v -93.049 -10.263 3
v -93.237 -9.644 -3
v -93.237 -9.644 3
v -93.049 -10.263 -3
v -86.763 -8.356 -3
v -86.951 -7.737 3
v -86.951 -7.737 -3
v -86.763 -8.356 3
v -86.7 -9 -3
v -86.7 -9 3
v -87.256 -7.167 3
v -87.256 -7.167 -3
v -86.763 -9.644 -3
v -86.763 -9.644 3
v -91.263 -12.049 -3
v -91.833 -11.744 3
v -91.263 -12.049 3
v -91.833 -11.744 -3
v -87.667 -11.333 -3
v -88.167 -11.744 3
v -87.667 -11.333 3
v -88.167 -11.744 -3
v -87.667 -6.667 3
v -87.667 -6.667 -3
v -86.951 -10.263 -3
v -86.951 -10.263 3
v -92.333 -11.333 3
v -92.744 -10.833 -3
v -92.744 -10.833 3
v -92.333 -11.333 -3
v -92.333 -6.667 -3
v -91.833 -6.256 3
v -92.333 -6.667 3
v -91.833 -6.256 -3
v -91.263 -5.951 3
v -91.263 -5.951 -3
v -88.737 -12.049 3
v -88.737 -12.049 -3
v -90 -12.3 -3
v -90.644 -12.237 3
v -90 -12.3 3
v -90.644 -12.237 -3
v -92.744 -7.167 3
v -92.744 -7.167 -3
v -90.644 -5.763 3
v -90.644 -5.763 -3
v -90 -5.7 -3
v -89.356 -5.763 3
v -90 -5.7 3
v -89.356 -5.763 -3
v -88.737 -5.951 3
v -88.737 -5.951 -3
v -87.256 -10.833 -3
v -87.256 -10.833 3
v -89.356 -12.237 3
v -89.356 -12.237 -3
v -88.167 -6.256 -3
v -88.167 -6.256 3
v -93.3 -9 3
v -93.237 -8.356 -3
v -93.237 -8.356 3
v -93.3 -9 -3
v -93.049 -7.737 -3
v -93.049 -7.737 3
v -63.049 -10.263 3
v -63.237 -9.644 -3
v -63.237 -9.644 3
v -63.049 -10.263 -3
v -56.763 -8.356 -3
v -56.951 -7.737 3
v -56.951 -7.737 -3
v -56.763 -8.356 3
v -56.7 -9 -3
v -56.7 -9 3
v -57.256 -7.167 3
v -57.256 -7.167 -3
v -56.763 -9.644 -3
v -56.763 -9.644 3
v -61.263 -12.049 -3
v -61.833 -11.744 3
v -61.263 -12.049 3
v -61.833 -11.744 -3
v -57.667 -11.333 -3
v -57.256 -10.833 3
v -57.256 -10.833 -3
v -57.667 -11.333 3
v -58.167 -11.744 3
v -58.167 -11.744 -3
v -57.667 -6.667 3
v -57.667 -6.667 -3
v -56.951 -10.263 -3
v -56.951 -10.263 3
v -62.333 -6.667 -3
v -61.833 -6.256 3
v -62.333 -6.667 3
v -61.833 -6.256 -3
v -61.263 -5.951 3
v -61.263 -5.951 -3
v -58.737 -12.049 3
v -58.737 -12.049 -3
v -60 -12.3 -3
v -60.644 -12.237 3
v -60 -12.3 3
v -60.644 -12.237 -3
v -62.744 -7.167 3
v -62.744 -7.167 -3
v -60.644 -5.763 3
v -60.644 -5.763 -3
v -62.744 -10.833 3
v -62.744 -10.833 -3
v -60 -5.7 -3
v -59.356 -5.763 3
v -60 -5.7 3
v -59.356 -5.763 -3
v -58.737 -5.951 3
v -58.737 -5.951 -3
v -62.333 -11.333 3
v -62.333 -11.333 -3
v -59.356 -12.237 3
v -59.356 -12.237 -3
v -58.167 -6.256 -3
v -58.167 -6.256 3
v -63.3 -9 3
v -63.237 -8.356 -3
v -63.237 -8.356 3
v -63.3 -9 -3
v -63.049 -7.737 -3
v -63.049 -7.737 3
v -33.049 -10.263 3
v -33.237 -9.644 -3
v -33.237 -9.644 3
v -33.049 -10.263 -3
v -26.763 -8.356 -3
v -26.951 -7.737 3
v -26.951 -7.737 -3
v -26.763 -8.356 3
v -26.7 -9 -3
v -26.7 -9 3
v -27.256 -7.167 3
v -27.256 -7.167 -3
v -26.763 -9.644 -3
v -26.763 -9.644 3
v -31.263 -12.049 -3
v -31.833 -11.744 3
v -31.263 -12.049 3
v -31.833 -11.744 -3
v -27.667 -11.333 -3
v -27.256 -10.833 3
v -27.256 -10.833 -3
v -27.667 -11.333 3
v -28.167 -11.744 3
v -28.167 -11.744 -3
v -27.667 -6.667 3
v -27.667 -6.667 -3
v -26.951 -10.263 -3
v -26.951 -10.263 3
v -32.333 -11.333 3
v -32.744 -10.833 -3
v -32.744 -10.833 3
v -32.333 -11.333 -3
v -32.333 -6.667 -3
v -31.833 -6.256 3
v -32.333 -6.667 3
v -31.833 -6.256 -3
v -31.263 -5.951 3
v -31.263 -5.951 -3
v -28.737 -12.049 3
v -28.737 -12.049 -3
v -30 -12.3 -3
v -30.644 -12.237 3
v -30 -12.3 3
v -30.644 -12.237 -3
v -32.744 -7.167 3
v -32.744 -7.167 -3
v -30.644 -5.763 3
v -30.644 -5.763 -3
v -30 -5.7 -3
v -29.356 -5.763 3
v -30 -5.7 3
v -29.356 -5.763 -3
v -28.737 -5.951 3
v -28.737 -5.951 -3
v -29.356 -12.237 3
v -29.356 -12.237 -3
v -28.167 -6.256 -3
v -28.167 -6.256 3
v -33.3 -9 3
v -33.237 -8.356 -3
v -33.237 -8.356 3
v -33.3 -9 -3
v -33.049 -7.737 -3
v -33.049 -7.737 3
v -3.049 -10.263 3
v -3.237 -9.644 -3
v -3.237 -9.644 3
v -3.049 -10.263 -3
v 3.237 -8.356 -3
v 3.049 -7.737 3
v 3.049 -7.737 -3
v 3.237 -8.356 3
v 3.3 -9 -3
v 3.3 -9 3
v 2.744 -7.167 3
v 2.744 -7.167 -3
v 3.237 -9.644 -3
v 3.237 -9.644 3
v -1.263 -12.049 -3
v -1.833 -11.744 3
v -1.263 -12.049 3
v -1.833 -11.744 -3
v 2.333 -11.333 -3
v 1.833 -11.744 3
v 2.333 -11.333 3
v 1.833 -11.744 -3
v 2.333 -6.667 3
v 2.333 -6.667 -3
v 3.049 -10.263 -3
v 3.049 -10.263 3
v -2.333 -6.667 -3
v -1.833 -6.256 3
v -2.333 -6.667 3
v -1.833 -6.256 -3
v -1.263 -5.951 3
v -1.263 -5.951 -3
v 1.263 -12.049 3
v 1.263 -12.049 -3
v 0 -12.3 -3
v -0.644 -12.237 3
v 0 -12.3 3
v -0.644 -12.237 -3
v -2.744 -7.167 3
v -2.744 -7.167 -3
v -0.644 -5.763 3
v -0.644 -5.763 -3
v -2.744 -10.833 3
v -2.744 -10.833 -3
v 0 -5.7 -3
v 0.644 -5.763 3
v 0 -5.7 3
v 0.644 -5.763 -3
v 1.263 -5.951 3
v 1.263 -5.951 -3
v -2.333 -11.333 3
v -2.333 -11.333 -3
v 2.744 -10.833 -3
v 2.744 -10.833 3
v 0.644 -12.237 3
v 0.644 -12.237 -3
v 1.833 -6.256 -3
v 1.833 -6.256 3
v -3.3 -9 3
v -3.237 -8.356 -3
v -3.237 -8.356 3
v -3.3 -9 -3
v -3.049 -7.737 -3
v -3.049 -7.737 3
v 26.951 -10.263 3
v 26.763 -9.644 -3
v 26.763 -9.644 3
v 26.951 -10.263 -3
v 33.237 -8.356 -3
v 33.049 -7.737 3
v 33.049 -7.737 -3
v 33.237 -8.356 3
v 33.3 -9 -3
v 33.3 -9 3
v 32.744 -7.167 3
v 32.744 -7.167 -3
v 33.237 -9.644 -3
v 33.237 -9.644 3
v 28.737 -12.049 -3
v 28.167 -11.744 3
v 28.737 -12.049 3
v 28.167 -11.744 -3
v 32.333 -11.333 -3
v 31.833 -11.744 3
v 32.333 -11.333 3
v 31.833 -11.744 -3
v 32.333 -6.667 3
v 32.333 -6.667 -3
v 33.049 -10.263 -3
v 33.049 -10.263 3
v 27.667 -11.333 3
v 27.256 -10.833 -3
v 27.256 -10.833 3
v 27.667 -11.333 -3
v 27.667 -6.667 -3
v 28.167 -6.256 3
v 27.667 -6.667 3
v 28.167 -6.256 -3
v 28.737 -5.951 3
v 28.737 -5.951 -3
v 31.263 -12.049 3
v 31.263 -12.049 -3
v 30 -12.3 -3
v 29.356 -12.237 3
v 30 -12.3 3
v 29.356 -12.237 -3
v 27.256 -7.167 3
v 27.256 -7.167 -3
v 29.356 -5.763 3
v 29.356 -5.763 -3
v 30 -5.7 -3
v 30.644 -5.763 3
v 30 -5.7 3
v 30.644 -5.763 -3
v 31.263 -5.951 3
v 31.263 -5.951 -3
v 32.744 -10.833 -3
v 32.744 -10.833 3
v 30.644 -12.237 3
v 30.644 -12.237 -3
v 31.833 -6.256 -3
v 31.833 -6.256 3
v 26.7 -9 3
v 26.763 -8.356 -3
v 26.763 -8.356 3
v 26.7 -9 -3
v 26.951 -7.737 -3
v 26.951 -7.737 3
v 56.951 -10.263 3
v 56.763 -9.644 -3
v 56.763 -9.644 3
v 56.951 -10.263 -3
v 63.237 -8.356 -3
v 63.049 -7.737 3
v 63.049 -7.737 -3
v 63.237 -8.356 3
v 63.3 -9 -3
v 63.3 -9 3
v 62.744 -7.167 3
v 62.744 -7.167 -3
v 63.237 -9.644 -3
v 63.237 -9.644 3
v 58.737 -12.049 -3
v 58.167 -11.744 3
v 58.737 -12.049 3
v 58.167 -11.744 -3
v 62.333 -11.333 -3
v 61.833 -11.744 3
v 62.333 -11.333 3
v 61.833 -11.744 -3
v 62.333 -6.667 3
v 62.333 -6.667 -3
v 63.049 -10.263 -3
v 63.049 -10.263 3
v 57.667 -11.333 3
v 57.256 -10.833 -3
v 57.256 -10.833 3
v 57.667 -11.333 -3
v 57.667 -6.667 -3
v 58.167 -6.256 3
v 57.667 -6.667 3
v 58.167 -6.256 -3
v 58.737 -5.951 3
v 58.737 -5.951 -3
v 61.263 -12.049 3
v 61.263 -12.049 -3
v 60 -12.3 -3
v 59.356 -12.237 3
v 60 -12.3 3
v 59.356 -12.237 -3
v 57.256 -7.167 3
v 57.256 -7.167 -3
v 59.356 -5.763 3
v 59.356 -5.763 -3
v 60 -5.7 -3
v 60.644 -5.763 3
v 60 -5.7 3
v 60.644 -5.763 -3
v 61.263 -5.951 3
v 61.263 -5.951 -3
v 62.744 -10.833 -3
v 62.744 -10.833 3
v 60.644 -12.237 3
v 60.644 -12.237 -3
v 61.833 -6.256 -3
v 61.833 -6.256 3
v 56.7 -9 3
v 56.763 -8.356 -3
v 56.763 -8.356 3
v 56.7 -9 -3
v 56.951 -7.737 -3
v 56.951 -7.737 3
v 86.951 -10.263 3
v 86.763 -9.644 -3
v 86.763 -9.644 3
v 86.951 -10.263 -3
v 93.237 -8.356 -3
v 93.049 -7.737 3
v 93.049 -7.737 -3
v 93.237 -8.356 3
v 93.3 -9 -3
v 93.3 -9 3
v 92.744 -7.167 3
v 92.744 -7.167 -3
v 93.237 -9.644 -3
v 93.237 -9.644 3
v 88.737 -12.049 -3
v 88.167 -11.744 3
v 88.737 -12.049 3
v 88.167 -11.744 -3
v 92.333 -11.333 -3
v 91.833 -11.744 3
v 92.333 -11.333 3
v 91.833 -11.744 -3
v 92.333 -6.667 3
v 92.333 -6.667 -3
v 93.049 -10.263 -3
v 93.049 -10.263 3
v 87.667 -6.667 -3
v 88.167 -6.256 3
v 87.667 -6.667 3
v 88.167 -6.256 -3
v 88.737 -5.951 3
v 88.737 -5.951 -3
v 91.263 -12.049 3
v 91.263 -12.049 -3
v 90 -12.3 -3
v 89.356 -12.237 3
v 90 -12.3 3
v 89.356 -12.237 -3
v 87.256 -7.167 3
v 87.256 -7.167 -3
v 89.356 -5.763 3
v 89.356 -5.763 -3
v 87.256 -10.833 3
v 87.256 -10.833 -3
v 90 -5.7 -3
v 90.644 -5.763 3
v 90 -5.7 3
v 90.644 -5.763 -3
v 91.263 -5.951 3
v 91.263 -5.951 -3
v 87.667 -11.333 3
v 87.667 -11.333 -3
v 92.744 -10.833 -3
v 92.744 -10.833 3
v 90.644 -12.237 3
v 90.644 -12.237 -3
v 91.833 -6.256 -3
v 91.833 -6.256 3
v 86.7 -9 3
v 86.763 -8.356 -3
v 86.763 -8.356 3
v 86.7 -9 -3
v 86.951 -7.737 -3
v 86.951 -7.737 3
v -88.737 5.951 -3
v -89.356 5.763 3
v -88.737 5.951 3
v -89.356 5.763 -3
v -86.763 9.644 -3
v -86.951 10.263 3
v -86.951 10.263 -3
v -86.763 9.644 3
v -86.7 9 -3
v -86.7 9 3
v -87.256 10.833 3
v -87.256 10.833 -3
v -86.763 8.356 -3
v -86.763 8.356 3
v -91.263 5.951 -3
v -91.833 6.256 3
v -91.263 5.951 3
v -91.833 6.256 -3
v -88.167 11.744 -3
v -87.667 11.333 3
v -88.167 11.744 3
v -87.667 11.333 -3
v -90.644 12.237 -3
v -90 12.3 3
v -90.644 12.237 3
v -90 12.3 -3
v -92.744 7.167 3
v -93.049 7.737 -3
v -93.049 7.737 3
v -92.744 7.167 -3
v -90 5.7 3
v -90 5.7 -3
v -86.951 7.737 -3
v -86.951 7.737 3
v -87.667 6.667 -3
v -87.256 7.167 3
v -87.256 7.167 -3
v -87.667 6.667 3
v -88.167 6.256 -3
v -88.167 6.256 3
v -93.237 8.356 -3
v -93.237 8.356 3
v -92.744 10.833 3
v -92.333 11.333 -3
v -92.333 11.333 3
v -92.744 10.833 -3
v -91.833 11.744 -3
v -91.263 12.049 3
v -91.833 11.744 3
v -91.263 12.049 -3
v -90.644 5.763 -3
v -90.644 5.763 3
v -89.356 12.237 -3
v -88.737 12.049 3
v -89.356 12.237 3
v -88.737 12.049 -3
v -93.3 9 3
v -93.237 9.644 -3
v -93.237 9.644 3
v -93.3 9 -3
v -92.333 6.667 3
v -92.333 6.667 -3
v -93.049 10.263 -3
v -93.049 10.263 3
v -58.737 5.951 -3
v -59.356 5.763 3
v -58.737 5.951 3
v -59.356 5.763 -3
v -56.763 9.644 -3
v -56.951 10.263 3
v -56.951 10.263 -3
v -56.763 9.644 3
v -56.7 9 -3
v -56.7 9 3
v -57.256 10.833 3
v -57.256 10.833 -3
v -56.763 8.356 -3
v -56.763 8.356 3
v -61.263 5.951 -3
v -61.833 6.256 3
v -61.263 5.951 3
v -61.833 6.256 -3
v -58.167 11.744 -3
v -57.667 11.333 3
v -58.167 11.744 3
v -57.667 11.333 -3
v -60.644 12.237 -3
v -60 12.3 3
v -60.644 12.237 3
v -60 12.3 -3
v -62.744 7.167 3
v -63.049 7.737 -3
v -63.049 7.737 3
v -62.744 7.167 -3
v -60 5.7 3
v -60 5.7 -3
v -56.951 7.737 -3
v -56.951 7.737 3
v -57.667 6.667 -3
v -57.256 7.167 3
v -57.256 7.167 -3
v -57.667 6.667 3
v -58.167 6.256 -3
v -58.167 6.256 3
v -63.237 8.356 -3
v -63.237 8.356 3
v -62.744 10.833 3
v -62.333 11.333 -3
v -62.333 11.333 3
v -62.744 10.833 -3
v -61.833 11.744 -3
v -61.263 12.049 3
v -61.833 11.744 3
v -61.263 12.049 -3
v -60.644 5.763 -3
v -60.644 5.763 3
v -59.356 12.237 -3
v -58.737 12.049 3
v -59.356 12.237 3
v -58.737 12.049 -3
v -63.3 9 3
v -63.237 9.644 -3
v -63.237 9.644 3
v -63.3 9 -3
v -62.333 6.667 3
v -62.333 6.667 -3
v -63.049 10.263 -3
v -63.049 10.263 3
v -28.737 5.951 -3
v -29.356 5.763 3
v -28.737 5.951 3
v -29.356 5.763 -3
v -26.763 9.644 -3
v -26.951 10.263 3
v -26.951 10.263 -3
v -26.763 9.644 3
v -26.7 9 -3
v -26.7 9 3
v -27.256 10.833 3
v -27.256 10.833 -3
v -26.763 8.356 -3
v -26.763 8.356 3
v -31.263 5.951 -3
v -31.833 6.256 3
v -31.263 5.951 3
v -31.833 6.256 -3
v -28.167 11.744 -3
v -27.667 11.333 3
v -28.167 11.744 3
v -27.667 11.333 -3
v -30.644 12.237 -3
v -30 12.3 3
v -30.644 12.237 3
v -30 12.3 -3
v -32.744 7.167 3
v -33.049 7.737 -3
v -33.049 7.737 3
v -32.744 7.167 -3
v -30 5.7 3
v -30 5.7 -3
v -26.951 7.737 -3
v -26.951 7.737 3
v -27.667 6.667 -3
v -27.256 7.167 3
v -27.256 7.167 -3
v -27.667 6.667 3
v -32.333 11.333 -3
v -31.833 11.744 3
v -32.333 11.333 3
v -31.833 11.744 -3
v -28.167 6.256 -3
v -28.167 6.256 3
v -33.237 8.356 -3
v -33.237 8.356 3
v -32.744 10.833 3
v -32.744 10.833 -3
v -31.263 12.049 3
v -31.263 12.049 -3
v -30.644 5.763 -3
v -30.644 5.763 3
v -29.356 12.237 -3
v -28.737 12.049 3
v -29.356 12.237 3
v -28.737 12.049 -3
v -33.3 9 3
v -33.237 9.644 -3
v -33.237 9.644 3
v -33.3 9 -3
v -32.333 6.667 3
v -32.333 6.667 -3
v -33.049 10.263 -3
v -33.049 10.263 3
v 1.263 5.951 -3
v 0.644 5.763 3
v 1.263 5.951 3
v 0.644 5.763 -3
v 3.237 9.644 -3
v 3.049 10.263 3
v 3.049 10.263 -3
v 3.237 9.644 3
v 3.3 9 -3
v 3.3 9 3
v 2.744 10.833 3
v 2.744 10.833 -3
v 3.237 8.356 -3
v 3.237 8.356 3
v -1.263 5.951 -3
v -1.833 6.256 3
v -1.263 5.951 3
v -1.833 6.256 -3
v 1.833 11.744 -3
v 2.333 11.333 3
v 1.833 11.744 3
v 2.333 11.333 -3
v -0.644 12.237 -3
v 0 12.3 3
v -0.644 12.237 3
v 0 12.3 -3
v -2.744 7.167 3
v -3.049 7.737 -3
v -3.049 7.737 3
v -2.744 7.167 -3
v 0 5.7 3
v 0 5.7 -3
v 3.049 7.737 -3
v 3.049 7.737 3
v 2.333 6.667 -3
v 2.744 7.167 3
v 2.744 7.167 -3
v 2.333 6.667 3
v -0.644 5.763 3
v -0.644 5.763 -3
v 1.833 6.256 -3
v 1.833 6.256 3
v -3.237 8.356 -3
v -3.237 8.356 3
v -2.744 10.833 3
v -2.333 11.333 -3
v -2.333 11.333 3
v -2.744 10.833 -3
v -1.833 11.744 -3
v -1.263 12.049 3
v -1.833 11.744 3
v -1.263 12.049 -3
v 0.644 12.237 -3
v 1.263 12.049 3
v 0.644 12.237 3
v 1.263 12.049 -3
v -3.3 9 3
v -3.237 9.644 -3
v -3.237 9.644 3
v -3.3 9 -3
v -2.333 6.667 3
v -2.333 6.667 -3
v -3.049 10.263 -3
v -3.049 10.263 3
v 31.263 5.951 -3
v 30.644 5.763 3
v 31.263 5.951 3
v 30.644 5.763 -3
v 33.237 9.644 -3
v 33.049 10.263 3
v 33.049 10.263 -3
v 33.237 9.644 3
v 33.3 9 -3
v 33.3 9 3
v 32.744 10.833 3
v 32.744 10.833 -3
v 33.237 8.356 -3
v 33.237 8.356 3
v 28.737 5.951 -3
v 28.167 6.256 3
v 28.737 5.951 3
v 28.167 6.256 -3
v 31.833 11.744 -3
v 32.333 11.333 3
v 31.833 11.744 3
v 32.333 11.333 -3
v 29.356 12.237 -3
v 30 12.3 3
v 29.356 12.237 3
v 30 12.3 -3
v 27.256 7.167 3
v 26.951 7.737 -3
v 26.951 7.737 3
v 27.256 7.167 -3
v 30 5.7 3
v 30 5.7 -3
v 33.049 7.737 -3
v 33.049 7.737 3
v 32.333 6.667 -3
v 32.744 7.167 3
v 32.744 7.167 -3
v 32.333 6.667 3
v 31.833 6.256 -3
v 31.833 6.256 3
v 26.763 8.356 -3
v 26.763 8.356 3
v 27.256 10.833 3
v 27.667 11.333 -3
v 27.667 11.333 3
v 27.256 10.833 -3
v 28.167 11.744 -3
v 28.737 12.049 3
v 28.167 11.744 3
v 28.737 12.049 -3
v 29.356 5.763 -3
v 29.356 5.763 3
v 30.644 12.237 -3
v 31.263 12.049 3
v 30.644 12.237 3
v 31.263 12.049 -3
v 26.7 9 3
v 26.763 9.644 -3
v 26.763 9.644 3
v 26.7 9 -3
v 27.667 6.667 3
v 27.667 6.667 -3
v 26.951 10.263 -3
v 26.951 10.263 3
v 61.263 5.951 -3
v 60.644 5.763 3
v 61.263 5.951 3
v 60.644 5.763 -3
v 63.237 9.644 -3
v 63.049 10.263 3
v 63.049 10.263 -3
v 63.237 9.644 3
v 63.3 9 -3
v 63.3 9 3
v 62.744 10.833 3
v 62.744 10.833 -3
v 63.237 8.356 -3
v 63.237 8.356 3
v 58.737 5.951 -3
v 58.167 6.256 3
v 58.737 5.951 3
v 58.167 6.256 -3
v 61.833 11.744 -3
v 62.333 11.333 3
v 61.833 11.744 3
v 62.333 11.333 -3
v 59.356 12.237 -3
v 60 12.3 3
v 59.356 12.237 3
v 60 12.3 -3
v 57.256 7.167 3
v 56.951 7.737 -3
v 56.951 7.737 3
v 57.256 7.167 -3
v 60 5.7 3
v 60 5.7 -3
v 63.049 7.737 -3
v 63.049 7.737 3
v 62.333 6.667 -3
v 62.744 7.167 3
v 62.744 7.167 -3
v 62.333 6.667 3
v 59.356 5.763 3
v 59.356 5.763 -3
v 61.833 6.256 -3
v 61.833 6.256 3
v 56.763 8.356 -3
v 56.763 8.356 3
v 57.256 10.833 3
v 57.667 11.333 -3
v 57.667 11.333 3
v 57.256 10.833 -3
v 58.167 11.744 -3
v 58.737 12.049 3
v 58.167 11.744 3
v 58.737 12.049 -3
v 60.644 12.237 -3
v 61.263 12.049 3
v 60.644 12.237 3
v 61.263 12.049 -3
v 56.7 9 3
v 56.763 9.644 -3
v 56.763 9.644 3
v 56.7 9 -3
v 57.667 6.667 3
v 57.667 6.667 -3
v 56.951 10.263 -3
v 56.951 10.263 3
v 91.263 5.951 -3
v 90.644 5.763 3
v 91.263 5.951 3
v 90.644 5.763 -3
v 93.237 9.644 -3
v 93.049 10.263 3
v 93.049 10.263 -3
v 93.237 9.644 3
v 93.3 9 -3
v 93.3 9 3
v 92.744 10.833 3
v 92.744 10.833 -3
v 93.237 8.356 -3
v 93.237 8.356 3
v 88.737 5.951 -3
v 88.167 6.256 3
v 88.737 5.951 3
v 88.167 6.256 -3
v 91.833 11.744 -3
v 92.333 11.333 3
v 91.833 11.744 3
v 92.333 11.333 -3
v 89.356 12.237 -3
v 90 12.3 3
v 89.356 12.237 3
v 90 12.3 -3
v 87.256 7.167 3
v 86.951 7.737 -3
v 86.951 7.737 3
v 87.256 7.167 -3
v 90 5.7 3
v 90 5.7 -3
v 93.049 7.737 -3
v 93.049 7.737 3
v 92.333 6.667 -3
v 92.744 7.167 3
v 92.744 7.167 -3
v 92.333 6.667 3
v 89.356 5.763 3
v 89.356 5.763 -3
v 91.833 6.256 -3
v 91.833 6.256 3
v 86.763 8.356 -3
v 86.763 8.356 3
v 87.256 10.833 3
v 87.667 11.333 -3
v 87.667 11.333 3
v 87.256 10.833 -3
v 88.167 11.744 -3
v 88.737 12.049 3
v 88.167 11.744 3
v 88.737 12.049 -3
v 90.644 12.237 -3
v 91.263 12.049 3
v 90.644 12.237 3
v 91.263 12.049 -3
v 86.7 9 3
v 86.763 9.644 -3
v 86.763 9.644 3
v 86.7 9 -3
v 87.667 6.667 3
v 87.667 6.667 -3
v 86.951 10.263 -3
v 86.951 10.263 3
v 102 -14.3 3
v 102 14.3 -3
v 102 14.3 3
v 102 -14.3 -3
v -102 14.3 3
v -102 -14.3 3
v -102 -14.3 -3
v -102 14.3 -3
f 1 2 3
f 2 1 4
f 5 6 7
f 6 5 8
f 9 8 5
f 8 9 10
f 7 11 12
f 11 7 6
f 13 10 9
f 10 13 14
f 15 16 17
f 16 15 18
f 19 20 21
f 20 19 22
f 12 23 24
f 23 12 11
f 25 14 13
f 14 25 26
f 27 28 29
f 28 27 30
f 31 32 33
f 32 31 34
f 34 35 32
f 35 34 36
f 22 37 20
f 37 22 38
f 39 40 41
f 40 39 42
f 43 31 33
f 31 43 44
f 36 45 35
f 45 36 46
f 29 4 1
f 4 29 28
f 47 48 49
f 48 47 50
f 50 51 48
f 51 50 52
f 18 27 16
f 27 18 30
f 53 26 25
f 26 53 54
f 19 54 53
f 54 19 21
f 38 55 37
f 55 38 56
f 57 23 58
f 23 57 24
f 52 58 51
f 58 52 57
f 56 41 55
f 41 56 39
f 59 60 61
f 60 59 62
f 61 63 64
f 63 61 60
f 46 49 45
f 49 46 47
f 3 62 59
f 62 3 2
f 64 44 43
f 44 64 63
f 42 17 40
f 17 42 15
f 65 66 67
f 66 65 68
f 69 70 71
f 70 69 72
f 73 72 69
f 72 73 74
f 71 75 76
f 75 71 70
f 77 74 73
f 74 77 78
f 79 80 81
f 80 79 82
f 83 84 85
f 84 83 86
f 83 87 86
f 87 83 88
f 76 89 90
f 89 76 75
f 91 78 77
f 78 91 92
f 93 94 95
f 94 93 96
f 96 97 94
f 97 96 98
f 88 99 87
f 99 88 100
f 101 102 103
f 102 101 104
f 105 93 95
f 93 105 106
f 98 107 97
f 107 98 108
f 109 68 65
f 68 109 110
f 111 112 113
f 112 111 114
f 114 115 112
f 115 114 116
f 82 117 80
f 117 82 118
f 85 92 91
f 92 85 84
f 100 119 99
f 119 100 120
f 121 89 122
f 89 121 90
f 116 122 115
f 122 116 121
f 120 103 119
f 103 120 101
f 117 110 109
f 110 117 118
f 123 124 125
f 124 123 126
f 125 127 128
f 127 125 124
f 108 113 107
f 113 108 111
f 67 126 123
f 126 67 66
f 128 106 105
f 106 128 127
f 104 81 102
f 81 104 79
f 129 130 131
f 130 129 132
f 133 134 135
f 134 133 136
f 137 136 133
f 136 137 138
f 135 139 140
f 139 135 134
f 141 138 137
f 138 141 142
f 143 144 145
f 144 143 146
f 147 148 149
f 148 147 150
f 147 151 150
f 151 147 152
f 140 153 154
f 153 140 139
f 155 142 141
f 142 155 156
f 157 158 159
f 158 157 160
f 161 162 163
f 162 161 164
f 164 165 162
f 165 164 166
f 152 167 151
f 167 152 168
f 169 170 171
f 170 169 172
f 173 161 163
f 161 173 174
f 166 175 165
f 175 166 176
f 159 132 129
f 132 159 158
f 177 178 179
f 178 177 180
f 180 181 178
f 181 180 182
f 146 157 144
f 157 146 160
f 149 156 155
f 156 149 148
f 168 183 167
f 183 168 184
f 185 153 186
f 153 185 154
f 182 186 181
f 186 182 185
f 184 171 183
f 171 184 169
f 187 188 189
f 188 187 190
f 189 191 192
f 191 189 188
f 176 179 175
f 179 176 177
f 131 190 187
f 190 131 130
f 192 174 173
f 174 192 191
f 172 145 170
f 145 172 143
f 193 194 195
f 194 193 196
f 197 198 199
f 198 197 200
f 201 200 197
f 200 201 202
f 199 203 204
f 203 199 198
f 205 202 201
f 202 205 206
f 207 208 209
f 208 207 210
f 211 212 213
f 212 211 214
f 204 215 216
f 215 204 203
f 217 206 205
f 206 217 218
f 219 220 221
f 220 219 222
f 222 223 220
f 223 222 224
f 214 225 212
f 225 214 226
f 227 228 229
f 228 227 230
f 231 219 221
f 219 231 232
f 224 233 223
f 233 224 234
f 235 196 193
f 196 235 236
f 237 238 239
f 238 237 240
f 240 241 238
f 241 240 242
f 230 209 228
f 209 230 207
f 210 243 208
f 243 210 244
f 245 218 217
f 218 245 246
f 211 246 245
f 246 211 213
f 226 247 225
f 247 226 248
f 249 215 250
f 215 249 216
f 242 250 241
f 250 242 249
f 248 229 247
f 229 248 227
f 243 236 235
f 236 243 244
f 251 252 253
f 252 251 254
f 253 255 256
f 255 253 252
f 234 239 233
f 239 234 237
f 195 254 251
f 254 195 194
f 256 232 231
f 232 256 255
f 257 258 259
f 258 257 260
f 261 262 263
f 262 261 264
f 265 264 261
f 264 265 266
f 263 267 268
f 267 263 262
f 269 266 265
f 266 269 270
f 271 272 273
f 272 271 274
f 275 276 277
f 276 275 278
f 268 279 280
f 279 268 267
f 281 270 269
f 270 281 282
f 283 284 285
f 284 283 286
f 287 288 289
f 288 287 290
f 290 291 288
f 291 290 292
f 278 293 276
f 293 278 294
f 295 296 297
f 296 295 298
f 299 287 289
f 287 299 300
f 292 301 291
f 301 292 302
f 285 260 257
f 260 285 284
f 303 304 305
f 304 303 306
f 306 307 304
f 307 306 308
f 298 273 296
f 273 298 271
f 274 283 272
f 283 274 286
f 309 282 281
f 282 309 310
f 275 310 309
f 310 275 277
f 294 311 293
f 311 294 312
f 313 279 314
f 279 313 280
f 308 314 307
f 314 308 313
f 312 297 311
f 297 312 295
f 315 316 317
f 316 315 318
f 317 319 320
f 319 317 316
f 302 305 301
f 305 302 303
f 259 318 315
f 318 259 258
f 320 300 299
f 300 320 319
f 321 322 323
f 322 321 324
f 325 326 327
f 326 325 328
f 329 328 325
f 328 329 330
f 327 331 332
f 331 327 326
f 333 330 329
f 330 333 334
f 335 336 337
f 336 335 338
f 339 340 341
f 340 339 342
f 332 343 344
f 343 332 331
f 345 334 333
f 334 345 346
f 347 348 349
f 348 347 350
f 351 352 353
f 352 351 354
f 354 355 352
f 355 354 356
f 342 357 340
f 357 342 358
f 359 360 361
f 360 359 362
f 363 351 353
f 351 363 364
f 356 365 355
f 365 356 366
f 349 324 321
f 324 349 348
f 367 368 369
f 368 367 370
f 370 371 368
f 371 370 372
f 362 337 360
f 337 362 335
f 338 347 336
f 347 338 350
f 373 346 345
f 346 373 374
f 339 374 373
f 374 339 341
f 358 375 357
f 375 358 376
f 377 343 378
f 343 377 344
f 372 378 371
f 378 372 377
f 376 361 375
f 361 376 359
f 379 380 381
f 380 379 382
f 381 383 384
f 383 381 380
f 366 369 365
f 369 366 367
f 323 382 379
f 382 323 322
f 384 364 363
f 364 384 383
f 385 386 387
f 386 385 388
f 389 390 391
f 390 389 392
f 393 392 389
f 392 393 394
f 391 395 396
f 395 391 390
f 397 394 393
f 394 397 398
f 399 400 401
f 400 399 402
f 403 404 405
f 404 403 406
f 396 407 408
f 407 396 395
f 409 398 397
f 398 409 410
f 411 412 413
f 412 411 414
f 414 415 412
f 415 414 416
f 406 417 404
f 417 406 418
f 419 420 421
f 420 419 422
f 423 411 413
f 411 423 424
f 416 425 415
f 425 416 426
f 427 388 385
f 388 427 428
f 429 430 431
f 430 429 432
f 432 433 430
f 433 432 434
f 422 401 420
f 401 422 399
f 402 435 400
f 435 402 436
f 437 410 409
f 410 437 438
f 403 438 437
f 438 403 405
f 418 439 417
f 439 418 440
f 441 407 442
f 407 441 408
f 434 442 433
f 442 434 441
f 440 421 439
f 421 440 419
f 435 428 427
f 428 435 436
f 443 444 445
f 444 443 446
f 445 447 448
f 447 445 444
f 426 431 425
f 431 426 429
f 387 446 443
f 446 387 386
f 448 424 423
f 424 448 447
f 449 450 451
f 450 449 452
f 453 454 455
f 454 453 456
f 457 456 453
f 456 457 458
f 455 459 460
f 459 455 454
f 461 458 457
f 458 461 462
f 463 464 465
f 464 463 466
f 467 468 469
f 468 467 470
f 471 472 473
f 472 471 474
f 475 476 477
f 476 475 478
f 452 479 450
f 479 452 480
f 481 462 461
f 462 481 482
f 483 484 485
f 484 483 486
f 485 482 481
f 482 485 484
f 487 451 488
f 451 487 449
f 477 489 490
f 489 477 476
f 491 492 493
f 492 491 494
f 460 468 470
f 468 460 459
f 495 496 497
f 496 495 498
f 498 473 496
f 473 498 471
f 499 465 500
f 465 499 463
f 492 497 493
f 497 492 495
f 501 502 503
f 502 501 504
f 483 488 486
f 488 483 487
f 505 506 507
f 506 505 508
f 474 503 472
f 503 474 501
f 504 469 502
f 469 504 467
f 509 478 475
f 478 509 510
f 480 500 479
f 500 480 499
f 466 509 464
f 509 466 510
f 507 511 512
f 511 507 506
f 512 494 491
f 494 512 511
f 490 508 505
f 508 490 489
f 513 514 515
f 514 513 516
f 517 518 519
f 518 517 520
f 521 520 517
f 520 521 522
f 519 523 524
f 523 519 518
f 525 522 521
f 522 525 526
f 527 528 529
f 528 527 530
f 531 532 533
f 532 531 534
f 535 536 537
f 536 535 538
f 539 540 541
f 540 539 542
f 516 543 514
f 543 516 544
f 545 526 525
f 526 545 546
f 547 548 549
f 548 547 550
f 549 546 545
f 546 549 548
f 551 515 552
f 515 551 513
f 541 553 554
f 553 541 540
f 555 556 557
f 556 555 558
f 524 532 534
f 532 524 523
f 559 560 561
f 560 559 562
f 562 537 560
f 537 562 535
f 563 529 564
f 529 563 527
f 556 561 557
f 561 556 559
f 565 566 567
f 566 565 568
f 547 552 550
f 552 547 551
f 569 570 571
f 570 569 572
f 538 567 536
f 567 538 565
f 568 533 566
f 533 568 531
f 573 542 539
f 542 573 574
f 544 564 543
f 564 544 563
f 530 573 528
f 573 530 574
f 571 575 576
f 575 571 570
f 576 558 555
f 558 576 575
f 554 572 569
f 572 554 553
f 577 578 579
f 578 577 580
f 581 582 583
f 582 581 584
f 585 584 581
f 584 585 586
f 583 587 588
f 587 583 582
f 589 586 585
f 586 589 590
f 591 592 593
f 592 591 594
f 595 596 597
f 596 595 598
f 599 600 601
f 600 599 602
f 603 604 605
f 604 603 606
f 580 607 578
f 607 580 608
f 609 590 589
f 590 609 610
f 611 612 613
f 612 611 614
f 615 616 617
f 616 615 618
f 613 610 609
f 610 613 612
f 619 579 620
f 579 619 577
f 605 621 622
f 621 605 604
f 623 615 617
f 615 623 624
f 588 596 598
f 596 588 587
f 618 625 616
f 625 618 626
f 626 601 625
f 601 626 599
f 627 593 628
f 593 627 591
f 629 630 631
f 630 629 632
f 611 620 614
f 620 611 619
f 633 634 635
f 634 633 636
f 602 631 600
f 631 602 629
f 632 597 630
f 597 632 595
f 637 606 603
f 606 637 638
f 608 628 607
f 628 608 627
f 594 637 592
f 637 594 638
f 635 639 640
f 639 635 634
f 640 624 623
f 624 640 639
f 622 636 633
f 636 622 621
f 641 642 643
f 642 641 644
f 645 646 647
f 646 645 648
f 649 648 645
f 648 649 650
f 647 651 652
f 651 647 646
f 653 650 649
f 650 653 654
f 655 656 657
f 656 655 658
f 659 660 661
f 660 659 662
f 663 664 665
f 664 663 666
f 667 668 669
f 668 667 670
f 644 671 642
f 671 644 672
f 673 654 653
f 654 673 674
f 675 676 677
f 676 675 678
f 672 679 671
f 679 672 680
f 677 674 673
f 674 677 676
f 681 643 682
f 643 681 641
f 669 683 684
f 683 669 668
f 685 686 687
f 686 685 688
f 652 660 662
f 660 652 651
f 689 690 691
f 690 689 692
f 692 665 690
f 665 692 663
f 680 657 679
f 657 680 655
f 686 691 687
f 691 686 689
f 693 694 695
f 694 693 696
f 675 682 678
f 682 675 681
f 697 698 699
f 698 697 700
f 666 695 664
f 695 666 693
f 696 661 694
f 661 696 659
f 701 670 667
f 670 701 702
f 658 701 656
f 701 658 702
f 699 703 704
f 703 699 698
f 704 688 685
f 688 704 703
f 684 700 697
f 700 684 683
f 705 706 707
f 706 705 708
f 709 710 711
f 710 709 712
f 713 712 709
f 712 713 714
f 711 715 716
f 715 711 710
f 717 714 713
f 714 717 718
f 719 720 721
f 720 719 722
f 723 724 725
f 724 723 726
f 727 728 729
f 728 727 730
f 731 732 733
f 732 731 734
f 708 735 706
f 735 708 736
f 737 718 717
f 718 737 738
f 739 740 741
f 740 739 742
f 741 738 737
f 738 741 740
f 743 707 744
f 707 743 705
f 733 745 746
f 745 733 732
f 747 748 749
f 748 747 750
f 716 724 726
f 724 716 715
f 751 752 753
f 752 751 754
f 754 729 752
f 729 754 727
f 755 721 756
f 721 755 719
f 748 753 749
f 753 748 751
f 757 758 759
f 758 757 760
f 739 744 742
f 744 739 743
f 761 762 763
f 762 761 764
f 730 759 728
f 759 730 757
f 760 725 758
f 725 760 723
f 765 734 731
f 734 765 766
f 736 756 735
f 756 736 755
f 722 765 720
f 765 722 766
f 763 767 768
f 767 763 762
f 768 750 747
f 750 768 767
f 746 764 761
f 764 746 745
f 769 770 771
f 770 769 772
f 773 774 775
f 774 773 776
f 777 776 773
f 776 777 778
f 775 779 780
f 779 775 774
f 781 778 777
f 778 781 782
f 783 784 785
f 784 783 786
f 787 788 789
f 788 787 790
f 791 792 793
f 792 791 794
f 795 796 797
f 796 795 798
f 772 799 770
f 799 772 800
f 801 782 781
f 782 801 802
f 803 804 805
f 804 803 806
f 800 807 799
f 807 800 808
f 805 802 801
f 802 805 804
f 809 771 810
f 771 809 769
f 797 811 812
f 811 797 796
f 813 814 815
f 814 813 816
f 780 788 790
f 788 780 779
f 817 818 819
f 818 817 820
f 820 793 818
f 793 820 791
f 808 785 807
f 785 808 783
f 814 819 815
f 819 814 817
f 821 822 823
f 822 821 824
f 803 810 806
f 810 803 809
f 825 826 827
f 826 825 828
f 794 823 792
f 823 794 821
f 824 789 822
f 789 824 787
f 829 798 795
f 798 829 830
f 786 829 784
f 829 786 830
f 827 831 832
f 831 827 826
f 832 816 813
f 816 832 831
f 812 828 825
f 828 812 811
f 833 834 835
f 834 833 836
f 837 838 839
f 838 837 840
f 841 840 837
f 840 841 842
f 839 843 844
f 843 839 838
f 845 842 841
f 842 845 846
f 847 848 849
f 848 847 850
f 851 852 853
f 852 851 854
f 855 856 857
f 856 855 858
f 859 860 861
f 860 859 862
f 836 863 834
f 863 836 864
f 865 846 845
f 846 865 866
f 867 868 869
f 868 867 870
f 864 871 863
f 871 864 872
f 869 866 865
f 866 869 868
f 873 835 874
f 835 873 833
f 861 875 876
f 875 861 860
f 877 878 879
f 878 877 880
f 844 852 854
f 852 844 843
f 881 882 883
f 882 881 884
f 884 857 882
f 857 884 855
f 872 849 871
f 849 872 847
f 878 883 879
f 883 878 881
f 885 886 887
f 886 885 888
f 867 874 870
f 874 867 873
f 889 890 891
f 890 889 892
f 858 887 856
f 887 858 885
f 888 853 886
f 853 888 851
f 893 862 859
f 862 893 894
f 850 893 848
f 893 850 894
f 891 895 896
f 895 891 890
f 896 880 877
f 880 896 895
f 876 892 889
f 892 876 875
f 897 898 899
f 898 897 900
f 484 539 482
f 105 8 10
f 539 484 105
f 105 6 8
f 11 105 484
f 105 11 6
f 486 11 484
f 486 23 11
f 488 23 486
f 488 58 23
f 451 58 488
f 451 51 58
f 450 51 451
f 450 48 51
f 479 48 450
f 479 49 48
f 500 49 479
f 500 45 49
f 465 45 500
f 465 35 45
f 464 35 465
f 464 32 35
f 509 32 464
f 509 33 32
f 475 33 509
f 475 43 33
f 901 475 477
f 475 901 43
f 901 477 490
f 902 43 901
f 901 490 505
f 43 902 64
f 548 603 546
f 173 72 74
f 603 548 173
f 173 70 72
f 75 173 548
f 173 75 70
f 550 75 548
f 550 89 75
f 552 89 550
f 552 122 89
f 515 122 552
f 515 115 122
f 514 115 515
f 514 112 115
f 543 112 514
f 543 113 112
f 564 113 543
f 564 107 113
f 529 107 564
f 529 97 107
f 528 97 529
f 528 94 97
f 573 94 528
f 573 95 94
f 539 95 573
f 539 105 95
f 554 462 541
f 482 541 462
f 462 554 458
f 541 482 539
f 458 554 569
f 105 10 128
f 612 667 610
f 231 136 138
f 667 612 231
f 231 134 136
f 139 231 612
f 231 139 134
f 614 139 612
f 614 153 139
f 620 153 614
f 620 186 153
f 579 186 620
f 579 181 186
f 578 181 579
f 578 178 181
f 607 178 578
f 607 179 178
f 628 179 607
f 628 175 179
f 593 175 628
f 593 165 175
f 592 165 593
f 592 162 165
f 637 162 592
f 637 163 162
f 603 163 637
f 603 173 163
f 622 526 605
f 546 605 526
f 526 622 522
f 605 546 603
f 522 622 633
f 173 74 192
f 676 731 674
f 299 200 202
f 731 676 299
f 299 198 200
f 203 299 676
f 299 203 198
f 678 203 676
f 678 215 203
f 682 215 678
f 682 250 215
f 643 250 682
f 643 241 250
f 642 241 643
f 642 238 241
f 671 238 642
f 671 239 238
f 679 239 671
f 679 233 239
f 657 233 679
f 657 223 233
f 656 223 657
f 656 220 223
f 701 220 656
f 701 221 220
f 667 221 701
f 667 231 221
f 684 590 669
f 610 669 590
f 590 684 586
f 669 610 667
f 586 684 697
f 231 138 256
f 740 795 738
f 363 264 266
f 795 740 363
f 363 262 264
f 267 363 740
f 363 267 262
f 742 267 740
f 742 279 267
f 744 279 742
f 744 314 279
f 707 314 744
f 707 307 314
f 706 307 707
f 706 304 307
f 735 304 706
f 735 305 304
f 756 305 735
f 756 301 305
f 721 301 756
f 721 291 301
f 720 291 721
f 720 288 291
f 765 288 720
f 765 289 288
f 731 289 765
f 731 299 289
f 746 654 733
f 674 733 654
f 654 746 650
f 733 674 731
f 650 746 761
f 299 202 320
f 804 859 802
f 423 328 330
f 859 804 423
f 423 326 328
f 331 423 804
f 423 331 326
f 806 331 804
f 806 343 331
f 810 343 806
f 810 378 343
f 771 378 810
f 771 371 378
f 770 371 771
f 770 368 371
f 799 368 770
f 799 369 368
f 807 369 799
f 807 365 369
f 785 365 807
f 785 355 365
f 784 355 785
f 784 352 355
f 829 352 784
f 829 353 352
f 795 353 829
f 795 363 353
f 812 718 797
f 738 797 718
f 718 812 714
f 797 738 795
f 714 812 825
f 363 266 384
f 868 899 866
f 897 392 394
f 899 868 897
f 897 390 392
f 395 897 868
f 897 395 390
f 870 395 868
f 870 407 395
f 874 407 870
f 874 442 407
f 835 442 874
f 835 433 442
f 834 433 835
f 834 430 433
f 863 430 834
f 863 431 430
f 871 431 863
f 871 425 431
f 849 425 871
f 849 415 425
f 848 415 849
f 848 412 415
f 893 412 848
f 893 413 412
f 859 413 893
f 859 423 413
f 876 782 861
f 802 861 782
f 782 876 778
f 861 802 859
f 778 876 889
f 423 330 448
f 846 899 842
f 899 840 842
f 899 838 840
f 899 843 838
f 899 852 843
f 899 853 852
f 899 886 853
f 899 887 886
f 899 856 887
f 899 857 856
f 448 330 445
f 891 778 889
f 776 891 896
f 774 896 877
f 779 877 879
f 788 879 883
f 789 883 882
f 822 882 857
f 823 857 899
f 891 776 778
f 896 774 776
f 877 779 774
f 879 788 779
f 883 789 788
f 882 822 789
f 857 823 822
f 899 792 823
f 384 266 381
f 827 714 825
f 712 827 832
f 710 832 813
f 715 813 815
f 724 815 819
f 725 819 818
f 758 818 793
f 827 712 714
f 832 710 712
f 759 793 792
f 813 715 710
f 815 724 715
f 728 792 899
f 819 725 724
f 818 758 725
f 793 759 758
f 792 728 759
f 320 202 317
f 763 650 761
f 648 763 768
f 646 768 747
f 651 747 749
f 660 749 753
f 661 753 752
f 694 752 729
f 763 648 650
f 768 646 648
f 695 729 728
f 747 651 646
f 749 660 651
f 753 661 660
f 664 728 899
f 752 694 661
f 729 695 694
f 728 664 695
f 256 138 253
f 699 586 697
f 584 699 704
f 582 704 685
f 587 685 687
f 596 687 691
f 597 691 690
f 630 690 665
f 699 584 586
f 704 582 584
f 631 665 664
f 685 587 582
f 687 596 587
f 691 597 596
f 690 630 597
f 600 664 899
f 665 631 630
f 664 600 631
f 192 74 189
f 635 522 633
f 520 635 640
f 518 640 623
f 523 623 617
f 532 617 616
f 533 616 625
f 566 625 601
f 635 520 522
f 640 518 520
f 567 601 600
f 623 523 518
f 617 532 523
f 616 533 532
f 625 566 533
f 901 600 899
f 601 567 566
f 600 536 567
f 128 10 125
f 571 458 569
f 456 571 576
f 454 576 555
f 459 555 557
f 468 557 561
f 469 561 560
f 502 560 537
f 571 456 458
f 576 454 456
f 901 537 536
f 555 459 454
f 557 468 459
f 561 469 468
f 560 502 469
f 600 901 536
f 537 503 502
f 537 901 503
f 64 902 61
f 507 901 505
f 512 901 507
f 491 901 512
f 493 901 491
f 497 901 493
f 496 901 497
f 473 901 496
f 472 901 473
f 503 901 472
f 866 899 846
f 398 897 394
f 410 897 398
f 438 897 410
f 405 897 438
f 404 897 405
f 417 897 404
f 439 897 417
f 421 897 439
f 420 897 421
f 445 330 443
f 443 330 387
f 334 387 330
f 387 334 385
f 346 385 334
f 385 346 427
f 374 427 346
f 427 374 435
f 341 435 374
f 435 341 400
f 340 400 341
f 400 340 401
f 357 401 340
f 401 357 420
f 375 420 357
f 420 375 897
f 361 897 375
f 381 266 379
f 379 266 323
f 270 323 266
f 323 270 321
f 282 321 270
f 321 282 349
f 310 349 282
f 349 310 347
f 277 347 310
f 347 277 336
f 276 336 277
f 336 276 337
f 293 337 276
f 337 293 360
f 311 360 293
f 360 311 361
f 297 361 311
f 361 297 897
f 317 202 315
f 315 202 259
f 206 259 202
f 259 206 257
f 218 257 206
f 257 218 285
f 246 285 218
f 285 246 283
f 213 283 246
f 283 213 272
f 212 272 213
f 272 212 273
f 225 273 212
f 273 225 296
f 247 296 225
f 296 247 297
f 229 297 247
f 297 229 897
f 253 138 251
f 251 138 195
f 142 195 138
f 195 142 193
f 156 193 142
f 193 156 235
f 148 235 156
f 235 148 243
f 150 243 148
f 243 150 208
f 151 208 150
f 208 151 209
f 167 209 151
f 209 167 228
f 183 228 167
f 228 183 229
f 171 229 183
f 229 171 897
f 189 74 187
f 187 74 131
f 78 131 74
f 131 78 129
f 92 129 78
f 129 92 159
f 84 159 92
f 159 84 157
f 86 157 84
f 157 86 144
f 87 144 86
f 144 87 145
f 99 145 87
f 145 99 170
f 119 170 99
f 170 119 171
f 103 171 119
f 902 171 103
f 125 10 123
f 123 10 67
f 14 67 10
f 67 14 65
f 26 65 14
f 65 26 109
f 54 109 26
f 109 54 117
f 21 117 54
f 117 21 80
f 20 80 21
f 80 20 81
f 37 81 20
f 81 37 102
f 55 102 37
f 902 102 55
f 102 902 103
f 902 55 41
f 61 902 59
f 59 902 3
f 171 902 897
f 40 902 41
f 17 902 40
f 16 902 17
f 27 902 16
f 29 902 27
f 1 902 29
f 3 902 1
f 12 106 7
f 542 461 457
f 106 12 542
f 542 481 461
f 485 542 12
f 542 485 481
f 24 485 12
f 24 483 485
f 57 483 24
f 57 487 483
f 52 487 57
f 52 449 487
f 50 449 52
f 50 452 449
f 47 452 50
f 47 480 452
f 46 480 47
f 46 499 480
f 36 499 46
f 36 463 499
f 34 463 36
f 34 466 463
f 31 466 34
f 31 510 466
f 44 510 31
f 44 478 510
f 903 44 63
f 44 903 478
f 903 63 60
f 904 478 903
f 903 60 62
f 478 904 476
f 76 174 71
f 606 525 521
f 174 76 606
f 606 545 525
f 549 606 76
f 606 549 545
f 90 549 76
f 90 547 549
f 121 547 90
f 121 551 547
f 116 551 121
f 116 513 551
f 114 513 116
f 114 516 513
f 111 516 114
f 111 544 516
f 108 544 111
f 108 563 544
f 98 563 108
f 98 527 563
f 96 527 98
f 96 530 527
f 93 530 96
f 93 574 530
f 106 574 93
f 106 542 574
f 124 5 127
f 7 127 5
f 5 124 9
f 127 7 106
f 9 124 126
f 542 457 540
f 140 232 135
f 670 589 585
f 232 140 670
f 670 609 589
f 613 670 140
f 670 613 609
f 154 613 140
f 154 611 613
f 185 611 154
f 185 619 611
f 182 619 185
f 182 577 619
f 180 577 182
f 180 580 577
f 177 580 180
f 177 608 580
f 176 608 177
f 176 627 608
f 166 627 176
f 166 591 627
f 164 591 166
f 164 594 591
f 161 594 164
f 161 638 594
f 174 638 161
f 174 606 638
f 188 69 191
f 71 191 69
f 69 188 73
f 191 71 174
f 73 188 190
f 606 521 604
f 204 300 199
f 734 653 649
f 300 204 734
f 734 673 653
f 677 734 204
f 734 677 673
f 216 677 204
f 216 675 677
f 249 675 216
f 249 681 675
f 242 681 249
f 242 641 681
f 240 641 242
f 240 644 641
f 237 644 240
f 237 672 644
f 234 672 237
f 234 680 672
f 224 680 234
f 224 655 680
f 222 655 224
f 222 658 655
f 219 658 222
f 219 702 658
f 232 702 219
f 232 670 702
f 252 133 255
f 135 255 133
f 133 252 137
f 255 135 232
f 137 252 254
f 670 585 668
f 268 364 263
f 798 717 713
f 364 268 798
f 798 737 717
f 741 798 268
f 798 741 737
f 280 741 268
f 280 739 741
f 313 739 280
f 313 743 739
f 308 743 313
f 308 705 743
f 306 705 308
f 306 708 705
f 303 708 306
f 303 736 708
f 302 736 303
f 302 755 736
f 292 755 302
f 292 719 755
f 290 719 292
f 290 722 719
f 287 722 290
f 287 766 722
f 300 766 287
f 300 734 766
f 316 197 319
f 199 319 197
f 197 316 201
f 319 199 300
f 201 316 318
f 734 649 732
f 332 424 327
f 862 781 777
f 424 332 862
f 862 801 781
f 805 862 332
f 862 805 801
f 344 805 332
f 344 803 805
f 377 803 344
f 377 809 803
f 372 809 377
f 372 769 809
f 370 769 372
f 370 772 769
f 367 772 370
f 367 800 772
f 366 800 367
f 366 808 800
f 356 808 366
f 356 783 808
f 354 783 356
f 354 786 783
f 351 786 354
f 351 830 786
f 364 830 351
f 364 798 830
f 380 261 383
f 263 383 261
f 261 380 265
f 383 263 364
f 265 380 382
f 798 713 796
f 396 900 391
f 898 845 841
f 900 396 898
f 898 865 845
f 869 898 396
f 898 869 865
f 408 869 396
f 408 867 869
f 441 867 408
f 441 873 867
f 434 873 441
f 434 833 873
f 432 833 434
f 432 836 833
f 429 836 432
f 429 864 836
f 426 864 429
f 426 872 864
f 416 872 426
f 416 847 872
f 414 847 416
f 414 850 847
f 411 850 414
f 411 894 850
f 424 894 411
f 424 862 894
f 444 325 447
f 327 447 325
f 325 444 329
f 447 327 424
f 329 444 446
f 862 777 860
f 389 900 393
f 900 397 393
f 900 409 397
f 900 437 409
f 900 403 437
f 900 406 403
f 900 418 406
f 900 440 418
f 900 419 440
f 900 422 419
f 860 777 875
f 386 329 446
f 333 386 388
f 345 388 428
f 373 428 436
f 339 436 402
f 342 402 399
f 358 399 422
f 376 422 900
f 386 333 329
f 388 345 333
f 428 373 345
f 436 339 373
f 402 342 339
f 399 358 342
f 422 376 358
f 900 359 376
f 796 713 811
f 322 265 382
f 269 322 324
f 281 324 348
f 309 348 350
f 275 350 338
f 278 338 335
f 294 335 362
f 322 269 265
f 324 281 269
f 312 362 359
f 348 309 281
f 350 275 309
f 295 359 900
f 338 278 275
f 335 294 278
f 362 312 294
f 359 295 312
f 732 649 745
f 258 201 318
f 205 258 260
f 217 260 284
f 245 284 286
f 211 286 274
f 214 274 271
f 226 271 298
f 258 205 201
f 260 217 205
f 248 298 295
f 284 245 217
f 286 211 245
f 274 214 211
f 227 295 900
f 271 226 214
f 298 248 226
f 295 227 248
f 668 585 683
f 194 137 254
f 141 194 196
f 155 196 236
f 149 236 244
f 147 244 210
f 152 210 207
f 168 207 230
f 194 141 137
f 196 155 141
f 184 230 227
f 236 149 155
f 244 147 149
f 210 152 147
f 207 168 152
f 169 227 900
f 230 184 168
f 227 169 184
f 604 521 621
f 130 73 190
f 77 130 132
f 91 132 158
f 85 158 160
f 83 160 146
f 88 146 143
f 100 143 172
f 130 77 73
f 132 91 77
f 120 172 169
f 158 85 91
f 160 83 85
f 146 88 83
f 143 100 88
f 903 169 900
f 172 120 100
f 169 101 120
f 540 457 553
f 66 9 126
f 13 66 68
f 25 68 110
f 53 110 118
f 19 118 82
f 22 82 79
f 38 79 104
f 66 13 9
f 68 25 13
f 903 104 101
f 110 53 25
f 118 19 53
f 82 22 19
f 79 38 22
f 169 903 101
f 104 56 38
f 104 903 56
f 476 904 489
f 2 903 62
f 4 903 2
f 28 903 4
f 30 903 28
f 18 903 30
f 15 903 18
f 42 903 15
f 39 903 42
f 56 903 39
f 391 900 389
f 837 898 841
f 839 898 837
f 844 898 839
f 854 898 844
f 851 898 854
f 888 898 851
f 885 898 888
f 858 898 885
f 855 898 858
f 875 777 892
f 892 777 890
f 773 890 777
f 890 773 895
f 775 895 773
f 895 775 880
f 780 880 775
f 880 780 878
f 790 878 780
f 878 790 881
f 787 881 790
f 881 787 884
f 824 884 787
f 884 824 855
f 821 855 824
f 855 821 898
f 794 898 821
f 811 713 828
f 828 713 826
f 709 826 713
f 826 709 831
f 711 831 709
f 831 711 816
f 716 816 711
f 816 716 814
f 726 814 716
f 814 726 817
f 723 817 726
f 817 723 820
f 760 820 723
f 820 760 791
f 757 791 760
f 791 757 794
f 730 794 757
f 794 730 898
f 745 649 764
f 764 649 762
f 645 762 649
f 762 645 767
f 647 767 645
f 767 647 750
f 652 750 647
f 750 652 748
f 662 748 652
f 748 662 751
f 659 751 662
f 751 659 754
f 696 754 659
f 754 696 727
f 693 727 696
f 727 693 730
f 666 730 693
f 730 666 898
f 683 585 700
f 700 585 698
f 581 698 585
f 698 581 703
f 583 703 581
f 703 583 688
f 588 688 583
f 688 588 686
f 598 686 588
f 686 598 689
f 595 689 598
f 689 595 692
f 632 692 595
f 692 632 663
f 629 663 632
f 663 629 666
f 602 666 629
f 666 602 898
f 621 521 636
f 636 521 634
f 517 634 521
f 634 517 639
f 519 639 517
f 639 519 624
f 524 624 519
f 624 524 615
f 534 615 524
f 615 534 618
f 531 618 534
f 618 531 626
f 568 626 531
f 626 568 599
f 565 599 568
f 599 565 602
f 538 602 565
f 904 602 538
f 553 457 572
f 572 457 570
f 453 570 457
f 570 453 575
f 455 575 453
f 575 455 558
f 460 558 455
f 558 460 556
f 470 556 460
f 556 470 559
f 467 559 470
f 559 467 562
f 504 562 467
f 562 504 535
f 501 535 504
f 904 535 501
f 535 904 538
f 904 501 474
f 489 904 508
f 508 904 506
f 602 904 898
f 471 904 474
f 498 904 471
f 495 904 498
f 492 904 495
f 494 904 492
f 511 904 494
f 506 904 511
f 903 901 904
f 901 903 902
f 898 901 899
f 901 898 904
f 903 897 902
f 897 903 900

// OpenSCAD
$fn = 32;

// ----------------------------------------------------------------------
// Hole bar, 7 x Ø6.6
// tworows layout, 12 mm edge offset
// ----------------------------------------------------------------------

// --- parameters (mm) ---
bar_w = 28.6;     // bar width (Y)
bar_t = 6;        // bar thickness (Z)
holes = 7;        // holes per row
hole_d = 6.6;     // hole diameter
edge = 12;        // offset from the bar end to the first hole
pitch = 30;       // pitch between neighbouring holes
row_offset = 18;  // distance between the two rows

// --- derived feature positions (mm) ---
span = (holes - 1) * pitch;   // = 180   distance between the end holes
bar_l = span + 2 * edge;      // = 204   overall bar length
start_x = -bar_l / 2 + edge;  // = -90   X of the first hole
feature_centers = [
  [start_x + 0 * pitch, -row_offset / 2],
  [start_x + 1 * pitch, -row_offset / 2],
  [start_x + 2 * pitch, -row_offset / 2],
  [start_x + 3 * pitch, -row_offset / 2],
  [start_x + 4 * pitch, -row_offset / 2],
  [start_x + 5 * pitch, -row_offset / 2],
  [start_x + 6 * pitch, -row_offset / 2]
];   // hole centres of the first row
row2_centers = [
  [start_x + 0 * pitch, row_offset / 2],
  [start_x + 1 * pitch, row_offset / 2],
  [start_x + 2 * pitch, row_offset / 2],
  [start_x + 3 * pitch, row_offset / 2],
  [start_x + 4 * pitch, row_offset / 2],
  [start_x + 5 * pitch, row_offset / 2],
  [start_x + 6 * pitch, row_offset / 2]
];   // hole centres of the second row

// bar with two rows of holes, both read from their own centre arrays
difference() {
  translate([-bar_l / 2, -bar_w / 2, -bar_t / 2]) cube([bar_l, bar_w, bar_t]);
  for (centre = feature_centers)
    translate([centre[0], centre[1], 0])
      cylinder(d = hole_d, h = bar_t + 2, center = true);
  for (centre = row2_centers)
    translate([centre[0], centre[1], 0])
      cylinder(d = hole_d, h = bar_t + 2, center = true);
}
